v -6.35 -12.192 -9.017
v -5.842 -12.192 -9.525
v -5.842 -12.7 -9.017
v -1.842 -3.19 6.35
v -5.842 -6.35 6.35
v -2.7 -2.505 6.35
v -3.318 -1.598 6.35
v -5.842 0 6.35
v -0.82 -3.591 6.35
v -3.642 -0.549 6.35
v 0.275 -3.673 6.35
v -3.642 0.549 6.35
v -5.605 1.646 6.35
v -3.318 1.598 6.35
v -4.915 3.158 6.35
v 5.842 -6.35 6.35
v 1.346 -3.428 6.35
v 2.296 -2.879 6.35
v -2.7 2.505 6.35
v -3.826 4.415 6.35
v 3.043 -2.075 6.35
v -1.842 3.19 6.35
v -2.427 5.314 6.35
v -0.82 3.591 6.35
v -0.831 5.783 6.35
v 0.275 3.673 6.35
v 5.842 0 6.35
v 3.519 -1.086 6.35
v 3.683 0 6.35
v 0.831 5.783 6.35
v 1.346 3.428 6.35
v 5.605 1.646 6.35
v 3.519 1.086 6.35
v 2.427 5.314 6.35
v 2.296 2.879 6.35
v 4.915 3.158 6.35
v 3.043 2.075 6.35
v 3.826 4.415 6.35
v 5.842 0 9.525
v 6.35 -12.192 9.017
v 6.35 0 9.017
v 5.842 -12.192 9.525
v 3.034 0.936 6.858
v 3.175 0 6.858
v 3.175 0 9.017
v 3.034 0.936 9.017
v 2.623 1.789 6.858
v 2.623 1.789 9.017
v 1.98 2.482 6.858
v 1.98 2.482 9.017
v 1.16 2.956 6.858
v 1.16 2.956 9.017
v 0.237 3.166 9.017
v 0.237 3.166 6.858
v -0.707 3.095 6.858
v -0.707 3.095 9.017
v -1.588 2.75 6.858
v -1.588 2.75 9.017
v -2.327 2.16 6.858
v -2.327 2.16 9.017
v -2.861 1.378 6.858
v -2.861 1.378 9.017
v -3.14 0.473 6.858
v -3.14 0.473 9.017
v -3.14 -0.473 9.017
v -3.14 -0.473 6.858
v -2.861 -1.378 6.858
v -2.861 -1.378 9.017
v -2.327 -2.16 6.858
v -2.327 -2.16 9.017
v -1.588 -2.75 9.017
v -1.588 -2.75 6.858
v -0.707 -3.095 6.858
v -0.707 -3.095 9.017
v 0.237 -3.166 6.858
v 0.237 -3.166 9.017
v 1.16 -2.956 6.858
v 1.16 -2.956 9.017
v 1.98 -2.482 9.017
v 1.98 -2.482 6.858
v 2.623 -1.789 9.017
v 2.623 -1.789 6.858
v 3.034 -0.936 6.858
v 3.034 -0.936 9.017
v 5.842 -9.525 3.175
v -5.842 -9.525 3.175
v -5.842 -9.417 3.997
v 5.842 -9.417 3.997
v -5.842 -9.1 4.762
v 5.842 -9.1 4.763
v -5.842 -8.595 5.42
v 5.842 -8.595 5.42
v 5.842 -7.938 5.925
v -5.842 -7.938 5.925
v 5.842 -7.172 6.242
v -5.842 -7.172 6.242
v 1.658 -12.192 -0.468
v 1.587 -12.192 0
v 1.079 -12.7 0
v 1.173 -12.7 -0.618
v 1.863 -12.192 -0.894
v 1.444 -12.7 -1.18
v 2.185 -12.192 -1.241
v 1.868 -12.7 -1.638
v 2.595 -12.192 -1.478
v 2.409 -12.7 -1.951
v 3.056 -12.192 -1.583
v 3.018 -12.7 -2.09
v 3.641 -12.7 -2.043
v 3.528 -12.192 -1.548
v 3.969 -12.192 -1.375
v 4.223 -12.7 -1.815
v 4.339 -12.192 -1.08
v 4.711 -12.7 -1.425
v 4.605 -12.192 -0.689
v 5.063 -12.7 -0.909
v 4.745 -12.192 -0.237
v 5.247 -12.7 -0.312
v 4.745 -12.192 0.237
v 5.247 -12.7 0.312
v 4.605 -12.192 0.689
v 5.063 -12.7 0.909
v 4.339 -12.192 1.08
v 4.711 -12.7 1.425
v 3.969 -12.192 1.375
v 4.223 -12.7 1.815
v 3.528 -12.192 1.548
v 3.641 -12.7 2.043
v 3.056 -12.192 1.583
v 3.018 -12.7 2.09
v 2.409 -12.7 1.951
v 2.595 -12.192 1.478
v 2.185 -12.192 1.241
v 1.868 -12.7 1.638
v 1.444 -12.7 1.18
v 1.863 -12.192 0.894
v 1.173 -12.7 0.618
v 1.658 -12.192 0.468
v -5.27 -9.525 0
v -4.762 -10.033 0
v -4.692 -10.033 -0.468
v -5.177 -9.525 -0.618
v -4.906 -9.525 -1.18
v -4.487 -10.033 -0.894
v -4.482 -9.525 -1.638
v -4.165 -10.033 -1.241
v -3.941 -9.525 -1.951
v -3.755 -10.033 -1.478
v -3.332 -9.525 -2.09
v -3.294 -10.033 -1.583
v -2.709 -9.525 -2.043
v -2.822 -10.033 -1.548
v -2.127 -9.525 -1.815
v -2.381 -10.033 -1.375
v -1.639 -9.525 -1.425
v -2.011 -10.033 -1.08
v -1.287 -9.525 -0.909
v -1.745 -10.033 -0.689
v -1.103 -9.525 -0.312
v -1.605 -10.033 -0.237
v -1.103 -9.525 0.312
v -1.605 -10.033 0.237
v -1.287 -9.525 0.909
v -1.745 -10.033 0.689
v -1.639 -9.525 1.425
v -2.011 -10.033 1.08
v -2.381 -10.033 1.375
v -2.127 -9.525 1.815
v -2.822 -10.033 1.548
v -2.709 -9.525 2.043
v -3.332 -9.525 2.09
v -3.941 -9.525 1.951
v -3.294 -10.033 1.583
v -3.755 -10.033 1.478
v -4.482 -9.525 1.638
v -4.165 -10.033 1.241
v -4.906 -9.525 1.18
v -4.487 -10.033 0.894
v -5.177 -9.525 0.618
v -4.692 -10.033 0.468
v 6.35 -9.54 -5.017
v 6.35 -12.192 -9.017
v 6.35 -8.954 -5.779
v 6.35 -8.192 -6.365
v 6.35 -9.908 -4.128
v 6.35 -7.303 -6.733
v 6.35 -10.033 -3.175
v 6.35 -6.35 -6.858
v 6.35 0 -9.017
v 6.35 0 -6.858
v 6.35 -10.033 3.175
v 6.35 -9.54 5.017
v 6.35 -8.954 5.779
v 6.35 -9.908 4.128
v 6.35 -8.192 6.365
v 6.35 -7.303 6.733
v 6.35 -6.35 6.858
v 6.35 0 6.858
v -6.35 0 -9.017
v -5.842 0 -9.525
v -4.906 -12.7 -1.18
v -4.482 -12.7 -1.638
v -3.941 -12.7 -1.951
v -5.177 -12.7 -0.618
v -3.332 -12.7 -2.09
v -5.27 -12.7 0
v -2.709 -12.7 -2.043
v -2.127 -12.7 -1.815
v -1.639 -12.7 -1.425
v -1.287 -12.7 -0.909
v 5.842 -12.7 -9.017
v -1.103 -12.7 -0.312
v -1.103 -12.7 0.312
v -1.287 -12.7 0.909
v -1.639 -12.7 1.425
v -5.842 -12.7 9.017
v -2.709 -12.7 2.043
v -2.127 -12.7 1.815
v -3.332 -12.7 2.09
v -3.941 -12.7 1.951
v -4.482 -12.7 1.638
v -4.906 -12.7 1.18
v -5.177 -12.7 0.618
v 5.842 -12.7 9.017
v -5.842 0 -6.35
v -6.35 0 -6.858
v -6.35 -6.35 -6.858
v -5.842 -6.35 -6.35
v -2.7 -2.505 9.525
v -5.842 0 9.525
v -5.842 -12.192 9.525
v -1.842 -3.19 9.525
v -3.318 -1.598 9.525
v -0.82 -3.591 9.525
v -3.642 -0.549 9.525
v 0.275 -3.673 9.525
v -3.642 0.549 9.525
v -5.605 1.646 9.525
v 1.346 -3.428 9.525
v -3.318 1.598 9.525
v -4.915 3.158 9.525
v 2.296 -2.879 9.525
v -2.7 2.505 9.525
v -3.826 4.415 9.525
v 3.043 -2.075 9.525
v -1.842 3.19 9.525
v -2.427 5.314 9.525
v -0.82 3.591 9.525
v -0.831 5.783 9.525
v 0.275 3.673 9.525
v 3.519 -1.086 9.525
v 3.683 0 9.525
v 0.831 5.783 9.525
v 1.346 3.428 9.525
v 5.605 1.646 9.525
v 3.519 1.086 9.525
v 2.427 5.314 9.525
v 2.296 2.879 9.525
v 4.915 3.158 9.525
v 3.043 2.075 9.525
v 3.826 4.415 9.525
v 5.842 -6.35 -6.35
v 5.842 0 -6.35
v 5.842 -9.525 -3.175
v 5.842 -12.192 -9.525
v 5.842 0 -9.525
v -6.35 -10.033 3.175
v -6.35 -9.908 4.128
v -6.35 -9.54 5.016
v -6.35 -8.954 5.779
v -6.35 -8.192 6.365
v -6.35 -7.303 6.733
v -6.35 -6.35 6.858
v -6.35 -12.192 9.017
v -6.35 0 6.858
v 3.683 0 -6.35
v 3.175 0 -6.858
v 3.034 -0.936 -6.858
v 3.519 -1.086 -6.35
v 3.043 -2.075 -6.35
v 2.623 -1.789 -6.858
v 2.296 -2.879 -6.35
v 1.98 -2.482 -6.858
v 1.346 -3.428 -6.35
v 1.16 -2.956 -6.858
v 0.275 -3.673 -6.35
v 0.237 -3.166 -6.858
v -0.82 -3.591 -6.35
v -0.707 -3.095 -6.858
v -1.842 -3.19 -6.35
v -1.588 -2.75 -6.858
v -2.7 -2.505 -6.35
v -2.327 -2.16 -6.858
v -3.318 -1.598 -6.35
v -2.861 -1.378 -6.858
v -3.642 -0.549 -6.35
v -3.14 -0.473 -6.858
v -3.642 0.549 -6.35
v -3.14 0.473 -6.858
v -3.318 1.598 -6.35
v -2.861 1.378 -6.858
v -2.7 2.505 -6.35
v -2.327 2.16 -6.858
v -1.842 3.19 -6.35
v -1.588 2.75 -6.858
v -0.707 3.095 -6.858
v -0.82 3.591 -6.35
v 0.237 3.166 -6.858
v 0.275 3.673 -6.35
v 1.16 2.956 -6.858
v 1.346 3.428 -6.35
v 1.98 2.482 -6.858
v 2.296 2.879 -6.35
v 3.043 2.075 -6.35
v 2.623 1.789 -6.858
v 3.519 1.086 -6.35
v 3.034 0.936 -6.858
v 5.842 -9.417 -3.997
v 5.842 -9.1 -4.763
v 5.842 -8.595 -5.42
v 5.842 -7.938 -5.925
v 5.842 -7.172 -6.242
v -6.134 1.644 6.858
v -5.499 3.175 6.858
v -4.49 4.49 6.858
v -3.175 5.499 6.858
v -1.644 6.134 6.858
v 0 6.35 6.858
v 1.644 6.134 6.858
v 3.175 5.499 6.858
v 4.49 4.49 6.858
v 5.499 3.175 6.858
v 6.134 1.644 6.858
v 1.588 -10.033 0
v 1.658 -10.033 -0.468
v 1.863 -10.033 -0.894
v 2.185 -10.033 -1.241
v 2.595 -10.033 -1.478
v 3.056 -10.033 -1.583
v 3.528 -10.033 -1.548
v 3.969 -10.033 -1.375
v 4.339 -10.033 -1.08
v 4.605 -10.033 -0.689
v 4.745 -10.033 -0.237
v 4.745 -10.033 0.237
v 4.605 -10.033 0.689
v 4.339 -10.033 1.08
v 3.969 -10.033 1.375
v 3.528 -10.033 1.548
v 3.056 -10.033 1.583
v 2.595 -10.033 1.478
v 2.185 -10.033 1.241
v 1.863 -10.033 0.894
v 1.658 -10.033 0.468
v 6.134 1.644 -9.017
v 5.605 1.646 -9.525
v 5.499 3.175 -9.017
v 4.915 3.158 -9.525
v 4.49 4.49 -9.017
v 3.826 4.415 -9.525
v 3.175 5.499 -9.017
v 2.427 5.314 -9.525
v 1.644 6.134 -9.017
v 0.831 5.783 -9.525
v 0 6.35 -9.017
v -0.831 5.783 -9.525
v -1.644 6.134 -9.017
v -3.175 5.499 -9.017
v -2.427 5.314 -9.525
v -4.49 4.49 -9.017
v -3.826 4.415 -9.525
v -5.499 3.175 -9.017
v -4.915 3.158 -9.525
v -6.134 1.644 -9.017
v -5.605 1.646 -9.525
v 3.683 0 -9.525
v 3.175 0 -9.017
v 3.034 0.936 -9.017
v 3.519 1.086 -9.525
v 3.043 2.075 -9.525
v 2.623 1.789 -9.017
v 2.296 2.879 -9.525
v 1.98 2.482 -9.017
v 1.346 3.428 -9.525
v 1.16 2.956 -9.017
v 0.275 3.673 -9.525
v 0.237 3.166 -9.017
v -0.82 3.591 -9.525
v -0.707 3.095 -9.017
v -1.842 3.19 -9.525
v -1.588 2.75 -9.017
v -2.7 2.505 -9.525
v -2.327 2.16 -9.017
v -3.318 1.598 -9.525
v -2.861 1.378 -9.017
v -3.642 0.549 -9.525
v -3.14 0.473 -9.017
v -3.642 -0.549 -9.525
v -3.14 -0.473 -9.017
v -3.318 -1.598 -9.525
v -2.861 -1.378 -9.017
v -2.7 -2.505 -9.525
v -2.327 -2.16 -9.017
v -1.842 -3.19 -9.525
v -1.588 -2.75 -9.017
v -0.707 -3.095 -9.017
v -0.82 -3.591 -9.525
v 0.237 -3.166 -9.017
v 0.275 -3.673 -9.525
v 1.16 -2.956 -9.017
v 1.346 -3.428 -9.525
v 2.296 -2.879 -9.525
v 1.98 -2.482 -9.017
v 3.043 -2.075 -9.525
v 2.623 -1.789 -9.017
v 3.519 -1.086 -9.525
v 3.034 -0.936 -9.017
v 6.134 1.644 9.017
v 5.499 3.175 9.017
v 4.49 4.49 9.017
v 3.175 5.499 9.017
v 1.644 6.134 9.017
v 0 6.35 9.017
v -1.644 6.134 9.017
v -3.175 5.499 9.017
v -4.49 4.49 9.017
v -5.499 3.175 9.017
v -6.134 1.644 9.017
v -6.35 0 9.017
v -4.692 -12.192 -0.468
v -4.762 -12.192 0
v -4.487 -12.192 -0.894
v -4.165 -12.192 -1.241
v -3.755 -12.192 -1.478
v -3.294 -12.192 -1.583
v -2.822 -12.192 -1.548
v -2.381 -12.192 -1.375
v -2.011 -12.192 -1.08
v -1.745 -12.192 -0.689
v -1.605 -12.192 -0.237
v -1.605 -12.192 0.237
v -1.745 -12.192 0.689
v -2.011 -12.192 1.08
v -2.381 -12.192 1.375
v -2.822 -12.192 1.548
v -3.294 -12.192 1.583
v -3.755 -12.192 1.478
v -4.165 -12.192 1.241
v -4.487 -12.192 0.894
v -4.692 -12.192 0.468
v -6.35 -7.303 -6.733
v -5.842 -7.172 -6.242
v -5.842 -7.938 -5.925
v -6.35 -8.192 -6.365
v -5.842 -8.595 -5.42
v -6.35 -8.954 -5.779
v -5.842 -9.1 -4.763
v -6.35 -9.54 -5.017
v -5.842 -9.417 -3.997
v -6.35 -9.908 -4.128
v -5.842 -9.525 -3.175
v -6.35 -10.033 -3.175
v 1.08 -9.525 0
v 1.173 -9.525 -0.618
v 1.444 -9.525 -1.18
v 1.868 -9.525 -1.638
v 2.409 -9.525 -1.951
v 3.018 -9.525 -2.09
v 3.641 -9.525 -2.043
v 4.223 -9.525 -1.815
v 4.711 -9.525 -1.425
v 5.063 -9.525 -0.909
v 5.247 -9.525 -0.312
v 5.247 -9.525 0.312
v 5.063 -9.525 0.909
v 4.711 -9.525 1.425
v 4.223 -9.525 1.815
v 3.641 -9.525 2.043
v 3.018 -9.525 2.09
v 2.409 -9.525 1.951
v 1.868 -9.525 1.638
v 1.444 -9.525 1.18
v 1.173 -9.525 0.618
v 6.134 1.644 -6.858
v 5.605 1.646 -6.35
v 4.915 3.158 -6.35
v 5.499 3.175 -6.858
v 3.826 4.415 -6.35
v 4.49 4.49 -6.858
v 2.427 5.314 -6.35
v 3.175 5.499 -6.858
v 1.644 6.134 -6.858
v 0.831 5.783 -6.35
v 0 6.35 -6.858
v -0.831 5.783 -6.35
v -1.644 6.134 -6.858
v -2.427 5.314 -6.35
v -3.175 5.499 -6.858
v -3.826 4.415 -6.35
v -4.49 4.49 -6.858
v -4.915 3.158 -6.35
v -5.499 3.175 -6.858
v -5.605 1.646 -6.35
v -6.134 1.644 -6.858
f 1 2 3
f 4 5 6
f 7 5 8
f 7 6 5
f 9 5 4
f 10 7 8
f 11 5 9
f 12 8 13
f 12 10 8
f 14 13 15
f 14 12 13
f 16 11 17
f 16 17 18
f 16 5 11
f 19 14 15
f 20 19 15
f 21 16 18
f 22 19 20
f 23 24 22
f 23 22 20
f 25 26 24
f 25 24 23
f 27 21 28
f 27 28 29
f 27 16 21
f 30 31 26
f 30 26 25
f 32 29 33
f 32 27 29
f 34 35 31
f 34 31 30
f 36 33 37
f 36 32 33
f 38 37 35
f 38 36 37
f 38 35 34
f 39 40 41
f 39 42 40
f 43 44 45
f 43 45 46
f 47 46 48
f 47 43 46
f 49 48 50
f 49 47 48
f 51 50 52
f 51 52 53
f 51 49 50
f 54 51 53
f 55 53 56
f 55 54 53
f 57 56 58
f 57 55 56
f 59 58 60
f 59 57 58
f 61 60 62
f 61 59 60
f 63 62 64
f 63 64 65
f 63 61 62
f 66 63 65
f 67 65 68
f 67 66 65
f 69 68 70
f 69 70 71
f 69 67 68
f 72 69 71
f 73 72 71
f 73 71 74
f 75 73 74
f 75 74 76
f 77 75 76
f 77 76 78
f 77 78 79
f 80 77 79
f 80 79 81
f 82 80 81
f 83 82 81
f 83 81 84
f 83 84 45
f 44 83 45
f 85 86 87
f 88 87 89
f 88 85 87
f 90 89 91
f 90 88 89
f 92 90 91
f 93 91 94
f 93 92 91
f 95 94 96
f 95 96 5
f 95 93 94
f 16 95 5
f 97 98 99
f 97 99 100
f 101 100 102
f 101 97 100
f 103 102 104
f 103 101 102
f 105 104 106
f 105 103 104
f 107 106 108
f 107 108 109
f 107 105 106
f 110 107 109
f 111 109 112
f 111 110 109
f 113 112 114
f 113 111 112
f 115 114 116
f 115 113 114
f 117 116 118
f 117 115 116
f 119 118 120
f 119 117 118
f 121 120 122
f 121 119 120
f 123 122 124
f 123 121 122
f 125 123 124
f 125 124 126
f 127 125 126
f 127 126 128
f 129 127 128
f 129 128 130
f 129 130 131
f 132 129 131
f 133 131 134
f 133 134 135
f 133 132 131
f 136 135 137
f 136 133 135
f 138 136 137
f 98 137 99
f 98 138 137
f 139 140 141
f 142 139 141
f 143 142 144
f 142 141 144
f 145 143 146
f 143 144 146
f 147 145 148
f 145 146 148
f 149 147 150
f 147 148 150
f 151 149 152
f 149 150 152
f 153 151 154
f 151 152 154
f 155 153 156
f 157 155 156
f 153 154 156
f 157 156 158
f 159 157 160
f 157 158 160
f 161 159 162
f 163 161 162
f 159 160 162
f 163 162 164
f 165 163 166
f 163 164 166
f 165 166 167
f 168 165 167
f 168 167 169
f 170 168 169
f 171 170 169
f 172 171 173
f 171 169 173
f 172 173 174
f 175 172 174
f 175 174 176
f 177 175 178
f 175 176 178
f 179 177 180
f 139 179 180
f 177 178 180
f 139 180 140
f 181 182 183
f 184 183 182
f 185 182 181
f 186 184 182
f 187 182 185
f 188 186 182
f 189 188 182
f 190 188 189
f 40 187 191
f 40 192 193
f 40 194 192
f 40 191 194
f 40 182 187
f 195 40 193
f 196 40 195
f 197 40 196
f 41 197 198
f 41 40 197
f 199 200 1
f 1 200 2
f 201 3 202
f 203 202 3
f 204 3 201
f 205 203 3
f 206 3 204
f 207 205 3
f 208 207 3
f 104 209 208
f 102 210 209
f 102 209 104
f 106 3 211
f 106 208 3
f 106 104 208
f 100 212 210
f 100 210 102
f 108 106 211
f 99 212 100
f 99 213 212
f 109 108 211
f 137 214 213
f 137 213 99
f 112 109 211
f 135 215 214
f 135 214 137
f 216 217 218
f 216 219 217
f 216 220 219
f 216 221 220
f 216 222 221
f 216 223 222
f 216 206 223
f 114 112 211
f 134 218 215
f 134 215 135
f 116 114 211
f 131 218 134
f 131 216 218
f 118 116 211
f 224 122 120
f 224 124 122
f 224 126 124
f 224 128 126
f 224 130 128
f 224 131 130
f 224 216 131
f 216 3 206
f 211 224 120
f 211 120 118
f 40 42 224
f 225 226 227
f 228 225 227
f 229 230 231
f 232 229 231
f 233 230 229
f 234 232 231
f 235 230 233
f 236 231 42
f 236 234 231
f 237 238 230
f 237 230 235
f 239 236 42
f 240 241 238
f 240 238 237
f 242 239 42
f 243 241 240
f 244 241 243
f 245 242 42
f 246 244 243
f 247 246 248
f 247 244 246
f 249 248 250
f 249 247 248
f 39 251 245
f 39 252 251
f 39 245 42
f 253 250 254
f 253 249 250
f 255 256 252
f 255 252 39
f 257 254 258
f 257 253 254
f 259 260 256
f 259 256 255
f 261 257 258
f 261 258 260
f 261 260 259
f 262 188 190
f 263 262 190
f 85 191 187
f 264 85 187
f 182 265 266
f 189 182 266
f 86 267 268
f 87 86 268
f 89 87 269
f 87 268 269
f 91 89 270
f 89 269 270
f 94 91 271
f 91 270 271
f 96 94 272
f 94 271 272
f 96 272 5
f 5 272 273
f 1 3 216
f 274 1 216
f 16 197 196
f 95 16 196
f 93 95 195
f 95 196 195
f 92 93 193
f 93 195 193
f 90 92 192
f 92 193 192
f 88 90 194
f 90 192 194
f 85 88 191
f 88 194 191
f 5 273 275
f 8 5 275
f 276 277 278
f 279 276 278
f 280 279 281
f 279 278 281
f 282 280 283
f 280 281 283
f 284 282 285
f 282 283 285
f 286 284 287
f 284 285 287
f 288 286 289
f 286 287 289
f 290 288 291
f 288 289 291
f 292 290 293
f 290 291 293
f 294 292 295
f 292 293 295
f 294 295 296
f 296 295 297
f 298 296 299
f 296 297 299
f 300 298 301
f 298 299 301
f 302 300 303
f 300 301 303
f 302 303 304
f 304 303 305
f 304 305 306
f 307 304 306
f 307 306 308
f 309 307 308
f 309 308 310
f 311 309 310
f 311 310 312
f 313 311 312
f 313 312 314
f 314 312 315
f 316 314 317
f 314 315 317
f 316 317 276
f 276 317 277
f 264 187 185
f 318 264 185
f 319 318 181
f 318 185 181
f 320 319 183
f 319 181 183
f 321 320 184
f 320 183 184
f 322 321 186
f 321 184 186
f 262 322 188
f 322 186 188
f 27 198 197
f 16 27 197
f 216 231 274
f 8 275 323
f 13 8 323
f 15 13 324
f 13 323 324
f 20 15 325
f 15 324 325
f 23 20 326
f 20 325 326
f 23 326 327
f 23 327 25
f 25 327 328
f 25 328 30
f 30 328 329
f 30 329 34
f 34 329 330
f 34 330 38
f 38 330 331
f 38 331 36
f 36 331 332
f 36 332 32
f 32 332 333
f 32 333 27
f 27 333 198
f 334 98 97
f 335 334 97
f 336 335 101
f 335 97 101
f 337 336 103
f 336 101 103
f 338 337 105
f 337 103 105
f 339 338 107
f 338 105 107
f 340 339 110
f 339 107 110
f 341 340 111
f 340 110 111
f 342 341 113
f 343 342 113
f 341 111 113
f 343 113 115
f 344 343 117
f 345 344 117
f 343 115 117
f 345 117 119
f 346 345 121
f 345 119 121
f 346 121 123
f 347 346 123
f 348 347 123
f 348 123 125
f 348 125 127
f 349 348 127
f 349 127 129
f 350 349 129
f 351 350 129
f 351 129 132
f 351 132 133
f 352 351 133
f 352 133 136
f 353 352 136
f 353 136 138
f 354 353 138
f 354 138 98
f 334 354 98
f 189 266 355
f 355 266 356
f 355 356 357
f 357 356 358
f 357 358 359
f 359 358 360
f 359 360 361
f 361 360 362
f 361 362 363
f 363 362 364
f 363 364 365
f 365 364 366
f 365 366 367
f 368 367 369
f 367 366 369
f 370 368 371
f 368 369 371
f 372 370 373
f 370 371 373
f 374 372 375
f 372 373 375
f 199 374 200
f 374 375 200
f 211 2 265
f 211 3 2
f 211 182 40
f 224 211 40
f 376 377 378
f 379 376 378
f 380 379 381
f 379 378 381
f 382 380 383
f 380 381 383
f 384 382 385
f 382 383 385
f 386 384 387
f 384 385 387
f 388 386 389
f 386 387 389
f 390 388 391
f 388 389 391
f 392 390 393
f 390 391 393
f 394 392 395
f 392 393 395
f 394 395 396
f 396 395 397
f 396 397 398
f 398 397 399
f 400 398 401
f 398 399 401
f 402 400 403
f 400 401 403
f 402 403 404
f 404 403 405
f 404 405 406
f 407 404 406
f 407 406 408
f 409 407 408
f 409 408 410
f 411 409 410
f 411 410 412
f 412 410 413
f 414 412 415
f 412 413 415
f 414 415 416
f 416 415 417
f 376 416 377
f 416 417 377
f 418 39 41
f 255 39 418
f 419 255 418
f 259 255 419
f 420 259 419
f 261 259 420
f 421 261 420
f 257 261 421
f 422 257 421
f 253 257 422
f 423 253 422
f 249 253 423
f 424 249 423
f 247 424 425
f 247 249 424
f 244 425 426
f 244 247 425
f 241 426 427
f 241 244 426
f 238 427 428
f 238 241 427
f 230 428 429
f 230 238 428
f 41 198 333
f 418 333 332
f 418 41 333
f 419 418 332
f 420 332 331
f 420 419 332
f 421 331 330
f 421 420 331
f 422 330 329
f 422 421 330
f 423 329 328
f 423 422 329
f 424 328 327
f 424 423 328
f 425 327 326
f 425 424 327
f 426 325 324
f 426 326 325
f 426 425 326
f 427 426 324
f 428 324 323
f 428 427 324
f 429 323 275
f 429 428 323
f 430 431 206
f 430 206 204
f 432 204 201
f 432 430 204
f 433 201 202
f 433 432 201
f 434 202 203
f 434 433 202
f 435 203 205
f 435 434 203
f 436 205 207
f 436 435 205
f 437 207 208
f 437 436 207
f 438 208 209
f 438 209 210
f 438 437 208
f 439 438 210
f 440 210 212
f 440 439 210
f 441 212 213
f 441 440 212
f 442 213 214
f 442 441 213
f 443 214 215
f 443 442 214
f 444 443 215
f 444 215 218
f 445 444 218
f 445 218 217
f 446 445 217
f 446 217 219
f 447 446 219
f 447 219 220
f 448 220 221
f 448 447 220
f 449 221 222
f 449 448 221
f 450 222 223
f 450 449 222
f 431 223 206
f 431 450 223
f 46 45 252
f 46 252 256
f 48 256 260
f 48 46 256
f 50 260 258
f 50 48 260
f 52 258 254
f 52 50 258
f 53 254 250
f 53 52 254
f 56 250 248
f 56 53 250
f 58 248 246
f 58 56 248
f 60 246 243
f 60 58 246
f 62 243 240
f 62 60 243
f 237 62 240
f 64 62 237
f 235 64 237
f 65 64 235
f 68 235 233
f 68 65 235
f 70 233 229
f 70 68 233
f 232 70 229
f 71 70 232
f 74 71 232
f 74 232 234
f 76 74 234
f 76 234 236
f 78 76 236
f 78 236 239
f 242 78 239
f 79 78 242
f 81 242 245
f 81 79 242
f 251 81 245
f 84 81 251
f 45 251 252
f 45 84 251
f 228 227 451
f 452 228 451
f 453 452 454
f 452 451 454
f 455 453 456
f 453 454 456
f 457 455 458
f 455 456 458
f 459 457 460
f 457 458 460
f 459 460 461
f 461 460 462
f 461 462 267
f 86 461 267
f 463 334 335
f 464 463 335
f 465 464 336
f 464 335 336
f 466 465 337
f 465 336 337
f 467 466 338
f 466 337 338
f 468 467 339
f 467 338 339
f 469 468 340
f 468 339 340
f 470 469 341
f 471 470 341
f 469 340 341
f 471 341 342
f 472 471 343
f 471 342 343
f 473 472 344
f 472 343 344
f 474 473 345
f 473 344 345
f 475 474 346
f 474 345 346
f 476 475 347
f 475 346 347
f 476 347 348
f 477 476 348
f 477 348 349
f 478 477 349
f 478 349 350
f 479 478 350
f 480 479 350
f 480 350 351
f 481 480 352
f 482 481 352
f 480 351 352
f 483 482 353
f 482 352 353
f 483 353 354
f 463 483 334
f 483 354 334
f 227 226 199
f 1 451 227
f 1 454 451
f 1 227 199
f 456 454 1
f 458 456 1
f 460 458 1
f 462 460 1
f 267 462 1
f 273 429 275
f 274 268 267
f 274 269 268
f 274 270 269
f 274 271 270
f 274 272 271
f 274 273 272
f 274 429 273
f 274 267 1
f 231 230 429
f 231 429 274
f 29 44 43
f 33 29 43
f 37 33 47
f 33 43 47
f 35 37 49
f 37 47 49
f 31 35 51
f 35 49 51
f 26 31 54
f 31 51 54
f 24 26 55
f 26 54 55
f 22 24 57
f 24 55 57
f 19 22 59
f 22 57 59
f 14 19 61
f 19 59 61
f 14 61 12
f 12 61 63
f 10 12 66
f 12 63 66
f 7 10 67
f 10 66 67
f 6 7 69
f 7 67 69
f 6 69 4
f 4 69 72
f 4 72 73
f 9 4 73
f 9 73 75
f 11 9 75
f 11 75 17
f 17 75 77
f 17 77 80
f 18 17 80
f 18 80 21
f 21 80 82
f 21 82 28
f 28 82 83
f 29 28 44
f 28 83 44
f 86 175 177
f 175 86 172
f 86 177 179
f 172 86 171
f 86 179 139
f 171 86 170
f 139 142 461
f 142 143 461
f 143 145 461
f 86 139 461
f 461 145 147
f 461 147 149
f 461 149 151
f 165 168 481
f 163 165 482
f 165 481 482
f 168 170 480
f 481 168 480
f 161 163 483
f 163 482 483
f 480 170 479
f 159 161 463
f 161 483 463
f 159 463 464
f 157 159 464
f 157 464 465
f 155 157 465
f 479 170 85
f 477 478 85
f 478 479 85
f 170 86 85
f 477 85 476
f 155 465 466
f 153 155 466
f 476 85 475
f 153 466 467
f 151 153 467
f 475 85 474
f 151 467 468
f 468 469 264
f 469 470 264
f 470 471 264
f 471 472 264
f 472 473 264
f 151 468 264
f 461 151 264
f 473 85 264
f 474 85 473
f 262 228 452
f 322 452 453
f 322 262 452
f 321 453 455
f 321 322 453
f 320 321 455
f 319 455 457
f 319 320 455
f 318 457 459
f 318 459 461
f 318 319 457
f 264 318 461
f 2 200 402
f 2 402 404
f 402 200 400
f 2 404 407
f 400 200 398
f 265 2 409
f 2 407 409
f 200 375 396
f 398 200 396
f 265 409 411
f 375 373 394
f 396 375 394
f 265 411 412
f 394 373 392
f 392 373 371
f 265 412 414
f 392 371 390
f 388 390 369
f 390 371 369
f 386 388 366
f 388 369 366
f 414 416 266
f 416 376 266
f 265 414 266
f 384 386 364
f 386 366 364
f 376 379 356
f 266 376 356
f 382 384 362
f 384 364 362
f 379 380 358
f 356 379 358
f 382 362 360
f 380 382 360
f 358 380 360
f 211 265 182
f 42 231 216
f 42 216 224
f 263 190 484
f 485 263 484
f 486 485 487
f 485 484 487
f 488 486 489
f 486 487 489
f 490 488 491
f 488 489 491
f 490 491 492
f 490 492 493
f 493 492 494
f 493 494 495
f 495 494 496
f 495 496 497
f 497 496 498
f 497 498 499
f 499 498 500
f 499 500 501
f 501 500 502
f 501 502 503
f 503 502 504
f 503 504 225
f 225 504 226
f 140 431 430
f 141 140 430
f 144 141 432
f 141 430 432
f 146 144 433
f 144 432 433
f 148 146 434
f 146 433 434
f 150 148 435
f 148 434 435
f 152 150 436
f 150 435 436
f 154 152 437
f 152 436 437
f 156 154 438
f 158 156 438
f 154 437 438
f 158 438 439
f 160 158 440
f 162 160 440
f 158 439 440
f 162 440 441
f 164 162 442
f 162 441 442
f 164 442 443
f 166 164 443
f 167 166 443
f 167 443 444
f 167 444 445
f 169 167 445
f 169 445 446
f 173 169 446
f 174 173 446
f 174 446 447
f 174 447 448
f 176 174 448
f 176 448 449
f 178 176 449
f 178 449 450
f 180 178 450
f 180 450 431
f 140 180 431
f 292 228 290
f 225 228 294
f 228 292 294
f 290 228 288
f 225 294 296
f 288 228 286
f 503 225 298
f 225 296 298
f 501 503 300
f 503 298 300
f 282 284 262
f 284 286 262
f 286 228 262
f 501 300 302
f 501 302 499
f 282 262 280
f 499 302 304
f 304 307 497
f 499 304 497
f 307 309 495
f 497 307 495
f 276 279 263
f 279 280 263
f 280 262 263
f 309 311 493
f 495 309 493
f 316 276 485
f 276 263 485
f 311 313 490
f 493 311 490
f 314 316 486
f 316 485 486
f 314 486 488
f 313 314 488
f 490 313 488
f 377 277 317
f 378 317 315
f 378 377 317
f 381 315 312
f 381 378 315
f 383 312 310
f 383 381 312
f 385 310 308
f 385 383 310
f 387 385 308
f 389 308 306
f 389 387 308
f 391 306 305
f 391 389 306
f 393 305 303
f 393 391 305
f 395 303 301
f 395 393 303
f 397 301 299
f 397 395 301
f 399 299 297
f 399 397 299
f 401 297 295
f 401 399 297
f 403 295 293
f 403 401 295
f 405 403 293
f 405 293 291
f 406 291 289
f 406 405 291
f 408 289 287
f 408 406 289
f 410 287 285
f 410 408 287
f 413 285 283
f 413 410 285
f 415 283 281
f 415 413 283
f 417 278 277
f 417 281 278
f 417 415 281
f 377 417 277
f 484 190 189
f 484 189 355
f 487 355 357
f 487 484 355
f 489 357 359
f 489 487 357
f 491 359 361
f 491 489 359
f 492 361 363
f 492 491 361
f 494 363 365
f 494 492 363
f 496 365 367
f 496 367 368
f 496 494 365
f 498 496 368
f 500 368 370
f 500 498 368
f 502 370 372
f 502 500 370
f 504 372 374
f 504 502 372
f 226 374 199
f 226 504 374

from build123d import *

# Parameters (mm, degrees)
SKETCH1_R                    = 3.175
BOSS_EXTRUDE1_DEPTH          = 9.525
SKETCH2_W                    = 12.7
SKETCH2_H                    = 15.875
CUT_EXTRUDE1_DEPTH           = 7.35
CUT_EXTRUDE1_DEPTH_BACK      = 7.35
F_1_8_0_125_DIAMETER_HOLE1_D = 3.175
FILLET2_R                    = 3.175
CHAMFER1_SIZE                = 0.508


with BuildPart() as part:
    # Sketch1 → Boss-Extrude1 (new body, symmetric)
    with BuildSketch(Plane.XY):
        with BuildLine():
            Line((-6.35, 0), (-6.35, -12.7))
            Line((-6.35, -12.7), (6.35, -12.7))
            Line((6.35, -12.7), (6.35, 0))
            ThreePointArc((6.35, 0), (0, 6.35), (-6.35, 0))
        make_face()
        Circle(SKETCH1_R, mode=Mode.SUBTRACT)
    extrude(amount=BOSS_EXTRUDE1_DEPTH, both=True)

    # Sketch2 → Cut-Extrude1 (cut, two sides)
    with BuildSketch(Plane(origin=(0, 0, 0), x_dir=(0, 0, -1), z_dir=(1, 0, 0))) as cut_extrude1_sk:
        with Locations((0, -1.5875)):
            Rectangle(SKETCH2_W, SKETCH2_H)
    extrude(amount=CUT_EXTRUDE1_DEPTH, mode=Mode.SUBTRACT)
    extrude(cut_extrude1_sk.sketch, amount=-CUT_EXTRUDE1_DEPTH_BACK, mode=Mode.SUBTRACT)

    # 1/8 (0.125) Diameter Hole1 (through all)
    with Locations(Plane(origin=(0, -9.525, 0), x_dir=(1, 0, 0), z_dir=(0, 1, 0))):
        with Locations((-3.175, 0), (3.175, 0)):
            Hole(F_1_8_0_125_DIAMETER_HOLE1_D / 2)

    # Fillet2
    fillet2_edges = [part.edges().sort_by_distance(p)[0] for p in [
        (0, -9.525, 6.35),
        (0, -9.525, -6.35),
    ]]
    fillet(fillet2_edges, radius=FILLET2_R)

    # Chamfer1
    chamfer1_edges = [part.edges().sort_by_distance(p)[0] for p in [
        (-6.35, -6.35, 9.525),
        (-3.175, 0, -9.525),
        (-3.175, 0, 9.525),
        (0, -12.7, 9.525),
        (0, 6.35, 6.35),
        (-6.35, -3.175, 6.35),
        (-3.175, 0, 6.35),
        (-3.175, 0, -6.35),
        (6.35, -3.175, -6.35),
        (0, 6.35, -6.35),
        (-6.35, -3.175, -6.35),
        (6.35, -3.175, 6.35),
        (6.35, -6.35, 9.525),
        (0, -12.7, -9.525),
        (4.7625, -9.525, 0),
        (4.7625, -12.7, 0),
        (-6.35, -6.35, -9.525),
        (-1.5875, -9.525, 0),
        (-1.5875, -12.7, 0),
        (0, 6.35, -9.525),
        (-6.35, -9.525, 0),
        (6.35, -9.525, 0),
        (6.35, -6.35, -9.525),
        (6.35, -8.59506403, -5.42006403),
        (-6.35, -8.59506403, -5.42006403),
        (6.35, -8.59506403, 5.42006403),
        (-6.35, -8.59506403, 5.42006403),
        (0, 6.35, 9.525),
        (6.35, -12.7, 0),
        (-6.35, -12.7, 0),
    ]]
    chamfer(chamfer1_edges, length=CHAMFER1_SIZE)


solid = part.part
